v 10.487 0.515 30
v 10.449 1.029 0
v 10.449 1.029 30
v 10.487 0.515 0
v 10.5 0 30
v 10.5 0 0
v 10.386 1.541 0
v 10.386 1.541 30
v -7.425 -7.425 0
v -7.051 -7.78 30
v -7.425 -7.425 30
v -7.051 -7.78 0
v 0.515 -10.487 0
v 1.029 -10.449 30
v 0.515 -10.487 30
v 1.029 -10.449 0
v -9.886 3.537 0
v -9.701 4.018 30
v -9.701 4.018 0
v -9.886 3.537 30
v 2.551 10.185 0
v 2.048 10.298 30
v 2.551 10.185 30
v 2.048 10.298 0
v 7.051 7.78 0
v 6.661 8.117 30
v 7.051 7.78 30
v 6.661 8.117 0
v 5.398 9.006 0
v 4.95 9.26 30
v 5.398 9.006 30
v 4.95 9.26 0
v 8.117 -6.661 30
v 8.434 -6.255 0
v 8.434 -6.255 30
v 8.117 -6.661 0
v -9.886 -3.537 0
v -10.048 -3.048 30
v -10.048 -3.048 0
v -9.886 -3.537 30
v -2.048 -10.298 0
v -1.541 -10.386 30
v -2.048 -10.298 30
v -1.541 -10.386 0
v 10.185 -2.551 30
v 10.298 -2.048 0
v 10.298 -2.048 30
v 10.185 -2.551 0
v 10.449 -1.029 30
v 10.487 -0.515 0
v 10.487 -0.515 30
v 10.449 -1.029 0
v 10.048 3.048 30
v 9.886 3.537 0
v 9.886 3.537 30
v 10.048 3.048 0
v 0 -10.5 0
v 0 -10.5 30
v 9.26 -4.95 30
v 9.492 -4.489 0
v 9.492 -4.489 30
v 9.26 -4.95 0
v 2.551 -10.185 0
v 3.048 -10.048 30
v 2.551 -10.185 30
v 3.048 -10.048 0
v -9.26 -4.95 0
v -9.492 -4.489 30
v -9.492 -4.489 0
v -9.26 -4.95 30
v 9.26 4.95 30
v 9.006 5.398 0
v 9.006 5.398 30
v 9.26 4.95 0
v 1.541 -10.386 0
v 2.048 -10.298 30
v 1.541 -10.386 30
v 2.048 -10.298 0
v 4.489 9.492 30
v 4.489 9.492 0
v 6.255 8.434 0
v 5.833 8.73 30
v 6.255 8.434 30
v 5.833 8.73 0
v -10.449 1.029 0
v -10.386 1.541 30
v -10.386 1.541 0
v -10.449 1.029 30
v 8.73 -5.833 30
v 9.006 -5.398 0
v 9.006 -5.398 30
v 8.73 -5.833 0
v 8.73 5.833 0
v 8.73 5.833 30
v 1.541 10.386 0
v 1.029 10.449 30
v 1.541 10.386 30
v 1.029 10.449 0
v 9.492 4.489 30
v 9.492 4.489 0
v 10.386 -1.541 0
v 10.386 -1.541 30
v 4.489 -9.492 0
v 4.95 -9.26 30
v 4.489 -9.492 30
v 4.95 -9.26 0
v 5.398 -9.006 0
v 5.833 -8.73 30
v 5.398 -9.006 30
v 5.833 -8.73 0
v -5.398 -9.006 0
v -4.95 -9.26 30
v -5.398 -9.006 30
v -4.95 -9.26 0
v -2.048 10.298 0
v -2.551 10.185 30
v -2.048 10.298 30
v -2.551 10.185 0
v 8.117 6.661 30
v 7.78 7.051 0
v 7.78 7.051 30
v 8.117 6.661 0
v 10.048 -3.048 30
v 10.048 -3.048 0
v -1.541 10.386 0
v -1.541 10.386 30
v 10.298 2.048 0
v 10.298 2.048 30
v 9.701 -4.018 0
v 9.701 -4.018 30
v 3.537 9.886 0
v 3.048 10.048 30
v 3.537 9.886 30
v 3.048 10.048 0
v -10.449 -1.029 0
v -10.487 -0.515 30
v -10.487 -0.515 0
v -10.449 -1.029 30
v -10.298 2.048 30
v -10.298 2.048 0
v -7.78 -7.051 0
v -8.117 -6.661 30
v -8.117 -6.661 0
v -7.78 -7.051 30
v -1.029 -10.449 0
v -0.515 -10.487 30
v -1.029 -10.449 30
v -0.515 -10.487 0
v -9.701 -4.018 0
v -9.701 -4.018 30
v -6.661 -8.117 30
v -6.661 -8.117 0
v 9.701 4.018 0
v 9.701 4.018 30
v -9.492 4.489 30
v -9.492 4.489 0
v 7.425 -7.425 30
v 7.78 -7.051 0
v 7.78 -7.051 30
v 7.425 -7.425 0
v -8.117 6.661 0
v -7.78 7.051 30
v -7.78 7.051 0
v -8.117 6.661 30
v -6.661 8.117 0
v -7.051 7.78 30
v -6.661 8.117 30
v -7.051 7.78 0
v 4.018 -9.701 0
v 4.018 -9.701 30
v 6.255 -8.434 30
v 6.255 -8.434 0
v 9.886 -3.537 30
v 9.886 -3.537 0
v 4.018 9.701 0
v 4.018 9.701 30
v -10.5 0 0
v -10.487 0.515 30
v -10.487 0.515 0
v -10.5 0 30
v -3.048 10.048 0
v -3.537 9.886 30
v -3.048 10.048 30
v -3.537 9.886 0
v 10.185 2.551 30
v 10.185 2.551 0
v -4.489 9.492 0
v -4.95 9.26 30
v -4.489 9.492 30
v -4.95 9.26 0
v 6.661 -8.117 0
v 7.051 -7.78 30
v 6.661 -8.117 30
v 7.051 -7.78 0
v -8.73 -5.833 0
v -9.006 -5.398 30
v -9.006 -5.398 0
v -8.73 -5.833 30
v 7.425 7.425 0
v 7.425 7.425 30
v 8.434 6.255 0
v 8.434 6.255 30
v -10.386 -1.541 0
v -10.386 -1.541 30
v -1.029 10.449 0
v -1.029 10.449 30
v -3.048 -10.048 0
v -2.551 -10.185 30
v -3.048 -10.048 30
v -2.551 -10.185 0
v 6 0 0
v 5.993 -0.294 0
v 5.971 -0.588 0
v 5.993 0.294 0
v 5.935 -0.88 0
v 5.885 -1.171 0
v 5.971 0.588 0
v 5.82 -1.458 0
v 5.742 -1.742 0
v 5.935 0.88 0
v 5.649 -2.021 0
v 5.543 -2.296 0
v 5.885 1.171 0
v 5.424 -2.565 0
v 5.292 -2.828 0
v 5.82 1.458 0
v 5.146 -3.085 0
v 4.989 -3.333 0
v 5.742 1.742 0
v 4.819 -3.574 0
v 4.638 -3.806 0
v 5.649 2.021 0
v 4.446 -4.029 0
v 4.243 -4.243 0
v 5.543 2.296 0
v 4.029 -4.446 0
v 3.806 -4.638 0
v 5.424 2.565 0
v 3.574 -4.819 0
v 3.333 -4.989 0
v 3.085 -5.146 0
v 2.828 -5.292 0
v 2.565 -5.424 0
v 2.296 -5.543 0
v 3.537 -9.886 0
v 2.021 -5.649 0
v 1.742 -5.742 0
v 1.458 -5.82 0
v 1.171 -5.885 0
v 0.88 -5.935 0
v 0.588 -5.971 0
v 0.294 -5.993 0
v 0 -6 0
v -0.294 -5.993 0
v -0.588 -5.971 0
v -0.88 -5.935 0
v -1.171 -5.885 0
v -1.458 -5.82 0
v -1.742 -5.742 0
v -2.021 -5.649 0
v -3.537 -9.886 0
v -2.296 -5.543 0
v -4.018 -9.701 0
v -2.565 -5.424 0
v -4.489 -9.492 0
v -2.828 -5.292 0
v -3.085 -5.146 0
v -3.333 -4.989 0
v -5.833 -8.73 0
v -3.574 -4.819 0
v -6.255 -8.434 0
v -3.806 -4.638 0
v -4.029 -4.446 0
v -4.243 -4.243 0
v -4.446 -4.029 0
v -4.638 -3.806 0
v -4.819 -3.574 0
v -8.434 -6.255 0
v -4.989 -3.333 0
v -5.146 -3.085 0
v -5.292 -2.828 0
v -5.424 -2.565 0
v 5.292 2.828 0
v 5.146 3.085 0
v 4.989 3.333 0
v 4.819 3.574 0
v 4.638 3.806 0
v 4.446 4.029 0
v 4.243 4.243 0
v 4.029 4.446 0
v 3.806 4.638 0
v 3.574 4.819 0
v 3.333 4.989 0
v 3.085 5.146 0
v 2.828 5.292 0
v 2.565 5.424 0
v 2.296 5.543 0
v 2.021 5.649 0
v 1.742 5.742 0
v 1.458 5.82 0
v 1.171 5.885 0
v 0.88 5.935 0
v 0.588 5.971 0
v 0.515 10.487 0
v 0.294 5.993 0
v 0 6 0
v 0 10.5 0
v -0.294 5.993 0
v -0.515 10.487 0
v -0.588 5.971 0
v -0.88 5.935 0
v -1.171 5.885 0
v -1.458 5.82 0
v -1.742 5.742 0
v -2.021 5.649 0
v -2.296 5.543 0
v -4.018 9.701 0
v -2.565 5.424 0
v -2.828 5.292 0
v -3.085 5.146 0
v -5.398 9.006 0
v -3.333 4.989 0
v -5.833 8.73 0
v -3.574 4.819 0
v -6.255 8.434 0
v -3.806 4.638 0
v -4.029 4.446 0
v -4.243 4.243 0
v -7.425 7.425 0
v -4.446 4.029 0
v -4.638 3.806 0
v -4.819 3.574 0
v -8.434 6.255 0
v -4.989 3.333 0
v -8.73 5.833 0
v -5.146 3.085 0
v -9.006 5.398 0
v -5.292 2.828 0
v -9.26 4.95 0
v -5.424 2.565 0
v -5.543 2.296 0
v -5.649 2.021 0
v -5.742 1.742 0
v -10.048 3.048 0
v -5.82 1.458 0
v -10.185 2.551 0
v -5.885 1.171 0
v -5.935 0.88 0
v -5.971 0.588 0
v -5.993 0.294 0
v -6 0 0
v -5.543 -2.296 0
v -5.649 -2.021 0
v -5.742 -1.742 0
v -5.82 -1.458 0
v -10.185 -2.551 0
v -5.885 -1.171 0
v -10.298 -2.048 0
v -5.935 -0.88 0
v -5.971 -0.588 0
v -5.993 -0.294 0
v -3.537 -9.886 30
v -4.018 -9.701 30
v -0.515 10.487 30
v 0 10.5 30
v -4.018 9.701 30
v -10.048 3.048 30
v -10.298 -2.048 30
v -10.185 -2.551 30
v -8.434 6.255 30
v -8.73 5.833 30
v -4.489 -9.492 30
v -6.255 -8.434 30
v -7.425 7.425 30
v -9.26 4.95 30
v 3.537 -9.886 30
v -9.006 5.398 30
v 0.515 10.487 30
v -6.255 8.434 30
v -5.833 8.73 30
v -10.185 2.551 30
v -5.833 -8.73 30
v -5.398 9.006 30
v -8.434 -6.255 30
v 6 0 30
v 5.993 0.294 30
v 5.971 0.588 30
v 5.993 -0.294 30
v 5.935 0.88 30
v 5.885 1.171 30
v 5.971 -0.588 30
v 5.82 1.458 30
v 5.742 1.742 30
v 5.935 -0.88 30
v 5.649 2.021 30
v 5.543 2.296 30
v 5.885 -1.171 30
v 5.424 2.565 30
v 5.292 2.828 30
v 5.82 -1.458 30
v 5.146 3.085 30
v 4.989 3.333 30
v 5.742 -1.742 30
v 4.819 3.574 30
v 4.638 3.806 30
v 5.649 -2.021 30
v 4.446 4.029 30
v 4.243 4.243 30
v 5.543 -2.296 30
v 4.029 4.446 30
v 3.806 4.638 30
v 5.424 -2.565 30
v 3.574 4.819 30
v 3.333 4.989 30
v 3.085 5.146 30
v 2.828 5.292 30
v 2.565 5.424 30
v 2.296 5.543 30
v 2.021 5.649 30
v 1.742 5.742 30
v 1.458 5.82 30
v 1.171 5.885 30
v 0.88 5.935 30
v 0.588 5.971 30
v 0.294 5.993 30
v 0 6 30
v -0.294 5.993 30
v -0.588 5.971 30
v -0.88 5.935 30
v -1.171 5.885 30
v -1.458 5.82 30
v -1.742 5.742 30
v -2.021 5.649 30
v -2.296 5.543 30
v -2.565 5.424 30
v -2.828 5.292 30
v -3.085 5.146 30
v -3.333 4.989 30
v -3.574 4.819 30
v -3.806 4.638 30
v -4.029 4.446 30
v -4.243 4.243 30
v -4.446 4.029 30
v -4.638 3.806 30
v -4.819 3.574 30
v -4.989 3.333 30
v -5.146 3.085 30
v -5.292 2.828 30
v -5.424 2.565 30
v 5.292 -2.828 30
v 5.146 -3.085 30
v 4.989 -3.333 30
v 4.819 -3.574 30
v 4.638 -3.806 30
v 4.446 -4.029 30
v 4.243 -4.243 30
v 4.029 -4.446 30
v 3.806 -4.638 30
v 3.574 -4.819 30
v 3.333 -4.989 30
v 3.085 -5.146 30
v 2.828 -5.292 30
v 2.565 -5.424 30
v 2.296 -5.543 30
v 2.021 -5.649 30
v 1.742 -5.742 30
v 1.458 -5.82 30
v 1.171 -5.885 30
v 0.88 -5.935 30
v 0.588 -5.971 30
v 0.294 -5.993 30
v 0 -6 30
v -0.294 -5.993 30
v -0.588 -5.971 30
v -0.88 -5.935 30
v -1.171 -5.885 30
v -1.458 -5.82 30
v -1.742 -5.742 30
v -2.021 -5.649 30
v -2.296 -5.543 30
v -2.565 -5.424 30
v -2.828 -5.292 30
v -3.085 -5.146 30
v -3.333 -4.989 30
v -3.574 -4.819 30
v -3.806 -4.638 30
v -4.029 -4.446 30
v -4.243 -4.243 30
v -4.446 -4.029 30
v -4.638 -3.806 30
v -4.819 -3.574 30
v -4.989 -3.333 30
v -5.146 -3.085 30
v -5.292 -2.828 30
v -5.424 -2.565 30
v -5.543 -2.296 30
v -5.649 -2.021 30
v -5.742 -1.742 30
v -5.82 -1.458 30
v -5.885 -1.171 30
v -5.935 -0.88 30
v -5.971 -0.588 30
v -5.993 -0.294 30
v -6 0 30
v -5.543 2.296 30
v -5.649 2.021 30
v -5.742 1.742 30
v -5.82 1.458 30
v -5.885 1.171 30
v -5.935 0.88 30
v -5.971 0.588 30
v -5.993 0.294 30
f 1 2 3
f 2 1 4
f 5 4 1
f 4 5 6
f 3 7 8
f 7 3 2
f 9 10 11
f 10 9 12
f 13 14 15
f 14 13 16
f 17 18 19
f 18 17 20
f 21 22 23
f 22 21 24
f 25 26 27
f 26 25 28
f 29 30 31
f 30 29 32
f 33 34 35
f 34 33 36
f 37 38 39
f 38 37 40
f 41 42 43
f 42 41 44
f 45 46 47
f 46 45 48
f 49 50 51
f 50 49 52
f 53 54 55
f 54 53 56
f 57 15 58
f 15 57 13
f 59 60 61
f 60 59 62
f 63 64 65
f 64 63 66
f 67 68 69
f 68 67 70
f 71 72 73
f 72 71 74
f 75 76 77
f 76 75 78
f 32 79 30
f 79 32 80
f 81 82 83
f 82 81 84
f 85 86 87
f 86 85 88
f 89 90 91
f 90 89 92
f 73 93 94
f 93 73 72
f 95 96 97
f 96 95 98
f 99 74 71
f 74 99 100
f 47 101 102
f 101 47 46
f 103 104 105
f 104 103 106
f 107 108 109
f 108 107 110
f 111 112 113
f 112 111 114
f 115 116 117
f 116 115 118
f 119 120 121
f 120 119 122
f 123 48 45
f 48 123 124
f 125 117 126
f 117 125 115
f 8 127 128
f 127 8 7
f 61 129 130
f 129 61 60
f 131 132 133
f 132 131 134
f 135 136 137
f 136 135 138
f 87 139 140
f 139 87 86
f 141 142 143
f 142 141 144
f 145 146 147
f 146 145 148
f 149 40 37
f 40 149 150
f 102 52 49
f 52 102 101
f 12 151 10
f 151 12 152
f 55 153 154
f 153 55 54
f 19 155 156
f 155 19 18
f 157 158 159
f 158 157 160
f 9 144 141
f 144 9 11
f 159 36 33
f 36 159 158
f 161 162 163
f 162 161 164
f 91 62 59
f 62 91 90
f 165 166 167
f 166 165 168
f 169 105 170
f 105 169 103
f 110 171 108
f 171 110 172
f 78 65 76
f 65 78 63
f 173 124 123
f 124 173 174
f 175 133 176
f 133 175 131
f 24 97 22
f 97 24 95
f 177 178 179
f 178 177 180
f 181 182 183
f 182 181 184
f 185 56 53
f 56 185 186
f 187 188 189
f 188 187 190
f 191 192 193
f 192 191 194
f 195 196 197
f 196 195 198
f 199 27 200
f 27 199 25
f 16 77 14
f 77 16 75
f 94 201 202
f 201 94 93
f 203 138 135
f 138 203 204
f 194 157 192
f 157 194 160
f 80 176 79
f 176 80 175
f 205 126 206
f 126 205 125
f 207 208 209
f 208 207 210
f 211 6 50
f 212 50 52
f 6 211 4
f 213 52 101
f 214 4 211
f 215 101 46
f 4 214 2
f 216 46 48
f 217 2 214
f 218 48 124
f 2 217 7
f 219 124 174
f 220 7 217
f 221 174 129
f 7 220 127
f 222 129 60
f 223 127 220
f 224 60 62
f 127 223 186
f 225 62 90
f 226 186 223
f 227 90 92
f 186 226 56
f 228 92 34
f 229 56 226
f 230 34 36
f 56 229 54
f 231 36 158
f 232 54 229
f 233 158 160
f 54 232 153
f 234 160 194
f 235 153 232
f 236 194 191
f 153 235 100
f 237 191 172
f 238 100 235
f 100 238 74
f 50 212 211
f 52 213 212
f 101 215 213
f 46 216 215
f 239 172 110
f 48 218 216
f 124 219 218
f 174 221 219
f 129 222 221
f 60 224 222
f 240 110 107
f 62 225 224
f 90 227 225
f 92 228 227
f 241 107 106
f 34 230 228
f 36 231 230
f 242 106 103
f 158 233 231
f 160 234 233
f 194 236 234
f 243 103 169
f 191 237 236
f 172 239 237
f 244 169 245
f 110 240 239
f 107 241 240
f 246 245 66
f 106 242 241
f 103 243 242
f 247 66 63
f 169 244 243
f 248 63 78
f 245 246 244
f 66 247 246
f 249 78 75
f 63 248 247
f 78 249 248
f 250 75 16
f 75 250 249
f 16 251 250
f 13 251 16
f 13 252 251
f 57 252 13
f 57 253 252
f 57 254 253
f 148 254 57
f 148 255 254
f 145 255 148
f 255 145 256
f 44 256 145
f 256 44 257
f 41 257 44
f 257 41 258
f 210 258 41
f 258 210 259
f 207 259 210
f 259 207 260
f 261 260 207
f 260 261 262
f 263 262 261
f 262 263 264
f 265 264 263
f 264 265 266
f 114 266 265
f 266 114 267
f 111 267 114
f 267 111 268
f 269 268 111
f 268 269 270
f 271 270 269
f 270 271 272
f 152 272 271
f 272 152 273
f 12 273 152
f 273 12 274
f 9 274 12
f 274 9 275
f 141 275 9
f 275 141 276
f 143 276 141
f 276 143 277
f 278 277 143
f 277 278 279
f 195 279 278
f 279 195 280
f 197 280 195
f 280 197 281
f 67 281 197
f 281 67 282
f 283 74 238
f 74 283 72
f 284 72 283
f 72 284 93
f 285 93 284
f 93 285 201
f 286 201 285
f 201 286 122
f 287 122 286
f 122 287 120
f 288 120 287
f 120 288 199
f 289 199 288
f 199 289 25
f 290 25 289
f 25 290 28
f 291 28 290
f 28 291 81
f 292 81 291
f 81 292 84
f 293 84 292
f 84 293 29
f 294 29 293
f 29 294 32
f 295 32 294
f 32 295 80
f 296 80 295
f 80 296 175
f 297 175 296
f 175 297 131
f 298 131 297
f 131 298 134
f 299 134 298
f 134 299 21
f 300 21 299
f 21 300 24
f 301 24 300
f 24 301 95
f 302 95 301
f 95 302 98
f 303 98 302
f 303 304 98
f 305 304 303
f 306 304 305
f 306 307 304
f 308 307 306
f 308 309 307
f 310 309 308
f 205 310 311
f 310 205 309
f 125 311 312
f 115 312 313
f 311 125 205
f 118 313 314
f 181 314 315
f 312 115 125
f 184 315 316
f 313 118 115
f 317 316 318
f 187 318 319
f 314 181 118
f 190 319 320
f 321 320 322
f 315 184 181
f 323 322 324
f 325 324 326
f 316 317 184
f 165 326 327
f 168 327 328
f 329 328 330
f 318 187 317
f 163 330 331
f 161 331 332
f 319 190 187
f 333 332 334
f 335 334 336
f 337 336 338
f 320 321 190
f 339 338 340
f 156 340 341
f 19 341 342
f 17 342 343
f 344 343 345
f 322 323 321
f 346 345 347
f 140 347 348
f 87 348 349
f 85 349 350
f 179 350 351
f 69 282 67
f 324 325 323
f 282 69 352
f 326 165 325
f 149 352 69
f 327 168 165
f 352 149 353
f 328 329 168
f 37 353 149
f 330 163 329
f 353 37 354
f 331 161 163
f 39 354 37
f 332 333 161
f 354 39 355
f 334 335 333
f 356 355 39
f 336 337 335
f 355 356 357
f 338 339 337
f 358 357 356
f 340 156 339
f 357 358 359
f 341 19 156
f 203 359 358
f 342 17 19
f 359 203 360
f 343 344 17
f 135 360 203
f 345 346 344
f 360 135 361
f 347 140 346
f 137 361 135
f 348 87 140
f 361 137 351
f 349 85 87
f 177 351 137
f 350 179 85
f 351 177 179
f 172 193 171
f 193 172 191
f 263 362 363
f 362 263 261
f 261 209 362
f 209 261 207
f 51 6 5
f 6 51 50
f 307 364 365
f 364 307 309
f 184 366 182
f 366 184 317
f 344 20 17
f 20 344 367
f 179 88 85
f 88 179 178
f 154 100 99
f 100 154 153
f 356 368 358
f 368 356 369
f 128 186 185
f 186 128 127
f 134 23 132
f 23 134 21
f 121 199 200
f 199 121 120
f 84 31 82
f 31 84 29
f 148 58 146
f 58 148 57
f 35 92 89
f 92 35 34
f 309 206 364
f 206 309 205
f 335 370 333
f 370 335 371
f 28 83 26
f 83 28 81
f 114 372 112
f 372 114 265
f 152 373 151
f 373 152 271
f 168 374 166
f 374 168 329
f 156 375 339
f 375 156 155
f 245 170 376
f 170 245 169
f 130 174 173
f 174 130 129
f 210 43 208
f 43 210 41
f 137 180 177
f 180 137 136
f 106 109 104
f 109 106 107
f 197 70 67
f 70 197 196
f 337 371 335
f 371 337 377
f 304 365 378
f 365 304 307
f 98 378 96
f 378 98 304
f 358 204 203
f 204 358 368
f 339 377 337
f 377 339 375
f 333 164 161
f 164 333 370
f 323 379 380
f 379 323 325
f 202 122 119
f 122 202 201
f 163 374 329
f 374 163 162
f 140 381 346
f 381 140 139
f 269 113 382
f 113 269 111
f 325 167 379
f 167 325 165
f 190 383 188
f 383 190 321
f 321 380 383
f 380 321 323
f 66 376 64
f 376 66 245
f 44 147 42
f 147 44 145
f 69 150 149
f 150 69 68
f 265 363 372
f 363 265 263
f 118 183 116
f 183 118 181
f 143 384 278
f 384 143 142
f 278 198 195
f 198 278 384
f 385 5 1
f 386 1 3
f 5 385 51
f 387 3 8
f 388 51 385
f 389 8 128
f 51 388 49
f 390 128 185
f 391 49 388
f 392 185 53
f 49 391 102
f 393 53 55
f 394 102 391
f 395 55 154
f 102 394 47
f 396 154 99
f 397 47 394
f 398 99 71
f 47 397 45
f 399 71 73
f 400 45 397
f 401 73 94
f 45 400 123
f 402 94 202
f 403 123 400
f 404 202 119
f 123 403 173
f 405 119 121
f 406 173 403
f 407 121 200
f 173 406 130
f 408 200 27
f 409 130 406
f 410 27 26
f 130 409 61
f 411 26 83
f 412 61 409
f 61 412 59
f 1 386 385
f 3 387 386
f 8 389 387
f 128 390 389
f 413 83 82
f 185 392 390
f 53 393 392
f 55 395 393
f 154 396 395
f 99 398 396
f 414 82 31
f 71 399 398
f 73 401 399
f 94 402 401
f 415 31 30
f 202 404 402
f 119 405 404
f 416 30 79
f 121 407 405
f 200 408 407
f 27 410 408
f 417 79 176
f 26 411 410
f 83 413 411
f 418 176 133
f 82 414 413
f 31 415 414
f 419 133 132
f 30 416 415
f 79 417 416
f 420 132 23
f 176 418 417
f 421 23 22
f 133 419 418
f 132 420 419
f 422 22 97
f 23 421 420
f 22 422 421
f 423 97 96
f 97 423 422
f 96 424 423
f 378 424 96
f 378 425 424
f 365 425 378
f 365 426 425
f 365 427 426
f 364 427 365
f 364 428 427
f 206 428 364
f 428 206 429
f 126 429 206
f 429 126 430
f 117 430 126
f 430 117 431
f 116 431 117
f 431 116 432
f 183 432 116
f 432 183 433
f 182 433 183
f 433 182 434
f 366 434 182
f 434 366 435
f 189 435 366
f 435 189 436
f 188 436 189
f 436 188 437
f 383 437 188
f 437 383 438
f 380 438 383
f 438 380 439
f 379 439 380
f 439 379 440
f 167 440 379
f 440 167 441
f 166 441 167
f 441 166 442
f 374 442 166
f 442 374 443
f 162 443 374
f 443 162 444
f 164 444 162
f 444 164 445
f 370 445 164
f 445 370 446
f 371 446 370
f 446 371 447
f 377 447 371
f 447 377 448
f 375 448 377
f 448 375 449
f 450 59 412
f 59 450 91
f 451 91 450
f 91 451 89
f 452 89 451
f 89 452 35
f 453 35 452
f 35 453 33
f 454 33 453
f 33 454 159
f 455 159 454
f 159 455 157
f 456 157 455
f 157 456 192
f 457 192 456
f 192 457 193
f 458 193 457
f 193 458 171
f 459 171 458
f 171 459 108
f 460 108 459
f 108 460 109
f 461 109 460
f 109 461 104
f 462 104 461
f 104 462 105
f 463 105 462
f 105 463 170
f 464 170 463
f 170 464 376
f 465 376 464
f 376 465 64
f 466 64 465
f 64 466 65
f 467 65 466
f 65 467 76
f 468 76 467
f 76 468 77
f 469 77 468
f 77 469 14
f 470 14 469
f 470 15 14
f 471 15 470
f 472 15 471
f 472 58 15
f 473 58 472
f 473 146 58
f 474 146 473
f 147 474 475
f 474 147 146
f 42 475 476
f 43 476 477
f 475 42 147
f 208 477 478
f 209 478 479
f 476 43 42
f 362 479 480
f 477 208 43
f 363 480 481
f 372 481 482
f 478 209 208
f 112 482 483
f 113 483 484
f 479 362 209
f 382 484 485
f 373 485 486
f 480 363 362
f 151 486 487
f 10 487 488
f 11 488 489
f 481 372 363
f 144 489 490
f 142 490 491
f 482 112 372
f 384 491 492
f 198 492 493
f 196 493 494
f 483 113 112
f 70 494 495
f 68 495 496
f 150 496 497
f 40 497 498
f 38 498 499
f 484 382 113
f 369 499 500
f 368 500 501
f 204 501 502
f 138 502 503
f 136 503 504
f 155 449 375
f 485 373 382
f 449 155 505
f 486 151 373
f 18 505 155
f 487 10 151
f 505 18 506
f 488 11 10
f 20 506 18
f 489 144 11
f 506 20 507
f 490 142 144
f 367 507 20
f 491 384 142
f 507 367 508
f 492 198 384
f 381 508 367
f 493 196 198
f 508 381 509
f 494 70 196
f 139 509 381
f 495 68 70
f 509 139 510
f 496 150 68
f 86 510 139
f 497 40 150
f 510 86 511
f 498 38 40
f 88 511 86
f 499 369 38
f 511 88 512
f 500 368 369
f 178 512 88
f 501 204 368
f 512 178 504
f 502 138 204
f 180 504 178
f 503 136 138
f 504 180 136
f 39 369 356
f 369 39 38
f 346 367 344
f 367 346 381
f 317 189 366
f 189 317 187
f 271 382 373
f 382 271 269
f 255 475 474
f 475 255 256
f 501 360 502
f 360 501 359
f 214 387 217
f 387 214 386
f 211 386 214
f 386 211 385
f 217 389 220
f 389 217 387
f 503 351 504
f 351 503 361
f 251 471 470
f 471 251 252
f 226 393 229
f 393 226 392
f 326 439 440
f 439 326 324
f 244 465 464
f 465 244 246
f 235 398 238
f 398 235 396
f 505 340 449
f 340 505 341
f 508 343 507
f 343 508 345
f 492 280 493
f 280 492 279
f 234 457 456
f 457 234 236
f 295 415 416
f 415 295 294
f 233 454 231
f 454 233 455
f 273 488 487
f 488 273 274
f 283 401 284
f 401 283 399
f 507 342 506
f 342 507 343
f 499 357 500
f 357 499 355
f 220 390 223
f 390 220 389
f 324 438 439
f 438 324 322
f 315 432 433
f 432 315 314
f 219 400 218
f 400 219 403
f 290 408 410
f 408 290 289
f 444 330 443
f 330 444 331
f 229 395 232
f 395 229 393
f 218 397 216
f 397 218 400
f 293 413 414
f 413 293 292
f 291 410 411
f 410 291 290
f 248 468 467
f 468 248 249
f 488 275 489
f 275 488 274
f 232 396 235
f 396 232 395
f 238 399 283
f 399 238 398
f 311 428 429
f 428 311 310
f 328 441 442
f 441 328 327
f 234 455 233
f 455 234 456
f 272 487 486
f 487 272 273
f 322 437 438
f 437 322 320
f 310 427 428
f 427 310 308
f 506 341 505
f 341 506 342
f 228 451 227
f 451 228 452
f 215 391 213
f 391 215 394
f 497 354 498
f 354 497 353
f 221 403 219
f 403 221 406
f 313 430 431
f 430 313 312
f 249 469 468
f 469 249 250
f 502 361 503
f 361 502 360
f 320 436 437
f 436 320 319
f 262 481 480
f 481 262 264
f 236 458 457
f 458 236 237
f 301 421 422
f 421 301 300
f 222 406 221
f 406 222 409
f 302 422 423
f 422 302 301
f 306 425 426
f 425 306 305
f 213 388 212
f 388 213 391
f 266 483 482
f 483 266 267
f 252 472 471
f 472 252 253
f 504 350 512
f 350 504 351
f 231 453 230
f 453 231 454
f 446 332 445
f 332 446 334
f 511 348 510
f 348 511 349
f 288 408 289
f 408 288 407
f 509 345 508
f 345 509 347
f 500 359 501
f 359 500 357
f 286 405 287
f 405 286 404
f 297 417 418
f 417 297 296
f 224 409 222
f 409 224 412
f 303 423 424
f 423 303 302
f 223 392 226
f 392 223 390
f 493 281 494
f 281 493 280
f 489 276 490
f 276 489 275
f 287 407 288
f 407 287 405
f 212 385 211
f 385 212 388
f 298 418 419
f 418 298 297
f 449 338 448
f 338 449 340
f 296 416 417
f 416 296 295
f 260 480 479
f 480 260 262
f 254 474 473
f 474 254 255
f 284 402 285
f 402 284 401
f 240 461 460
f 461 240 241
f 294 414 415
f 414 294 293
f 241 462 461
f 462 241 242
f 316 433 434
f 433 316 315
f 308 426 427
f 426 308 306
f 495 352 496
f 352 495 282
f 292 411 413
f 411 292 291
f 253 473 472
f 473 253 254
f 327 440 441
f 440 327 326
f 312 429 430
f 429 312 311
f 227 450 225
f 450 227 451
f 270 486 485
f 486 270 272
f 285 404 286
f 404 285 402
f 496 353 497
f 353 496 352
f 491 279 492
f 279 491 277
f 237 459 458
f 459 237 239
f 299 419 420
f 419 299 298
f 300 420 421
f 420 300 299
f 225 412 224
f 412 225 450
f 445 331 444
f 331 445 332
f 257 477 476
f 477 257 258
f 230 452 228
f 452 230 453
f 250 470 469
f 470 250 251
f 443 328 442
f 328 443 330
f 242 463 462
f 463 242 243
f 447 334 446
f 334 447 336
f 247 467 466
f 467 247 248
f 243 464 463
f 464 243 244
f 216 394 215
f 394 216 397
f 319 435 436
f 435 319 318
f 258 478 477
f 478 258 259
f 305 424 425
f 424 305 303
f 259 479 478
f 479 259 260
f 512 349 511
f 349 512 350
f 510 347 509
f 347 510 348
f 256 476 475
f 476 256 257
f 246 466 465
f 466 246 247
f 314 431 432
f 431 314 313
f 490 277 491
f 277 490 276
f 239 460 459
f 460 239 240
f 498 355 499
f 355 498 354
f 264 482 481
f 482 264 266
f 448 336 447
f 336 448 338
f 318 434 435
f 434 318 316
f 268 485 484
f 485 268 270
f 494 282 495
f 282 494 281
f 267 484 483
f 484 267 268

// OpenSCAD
$fn = 128;

bore_d = 12.0;
od_d   = 21.0;
len    = 30.0;

difference() {
  cylinder(d = od_d, h = len, center = false);
  translate([0,0,-0.1])
    cylinder(d = bore_d, h = len + 0.2, center = false);
}
